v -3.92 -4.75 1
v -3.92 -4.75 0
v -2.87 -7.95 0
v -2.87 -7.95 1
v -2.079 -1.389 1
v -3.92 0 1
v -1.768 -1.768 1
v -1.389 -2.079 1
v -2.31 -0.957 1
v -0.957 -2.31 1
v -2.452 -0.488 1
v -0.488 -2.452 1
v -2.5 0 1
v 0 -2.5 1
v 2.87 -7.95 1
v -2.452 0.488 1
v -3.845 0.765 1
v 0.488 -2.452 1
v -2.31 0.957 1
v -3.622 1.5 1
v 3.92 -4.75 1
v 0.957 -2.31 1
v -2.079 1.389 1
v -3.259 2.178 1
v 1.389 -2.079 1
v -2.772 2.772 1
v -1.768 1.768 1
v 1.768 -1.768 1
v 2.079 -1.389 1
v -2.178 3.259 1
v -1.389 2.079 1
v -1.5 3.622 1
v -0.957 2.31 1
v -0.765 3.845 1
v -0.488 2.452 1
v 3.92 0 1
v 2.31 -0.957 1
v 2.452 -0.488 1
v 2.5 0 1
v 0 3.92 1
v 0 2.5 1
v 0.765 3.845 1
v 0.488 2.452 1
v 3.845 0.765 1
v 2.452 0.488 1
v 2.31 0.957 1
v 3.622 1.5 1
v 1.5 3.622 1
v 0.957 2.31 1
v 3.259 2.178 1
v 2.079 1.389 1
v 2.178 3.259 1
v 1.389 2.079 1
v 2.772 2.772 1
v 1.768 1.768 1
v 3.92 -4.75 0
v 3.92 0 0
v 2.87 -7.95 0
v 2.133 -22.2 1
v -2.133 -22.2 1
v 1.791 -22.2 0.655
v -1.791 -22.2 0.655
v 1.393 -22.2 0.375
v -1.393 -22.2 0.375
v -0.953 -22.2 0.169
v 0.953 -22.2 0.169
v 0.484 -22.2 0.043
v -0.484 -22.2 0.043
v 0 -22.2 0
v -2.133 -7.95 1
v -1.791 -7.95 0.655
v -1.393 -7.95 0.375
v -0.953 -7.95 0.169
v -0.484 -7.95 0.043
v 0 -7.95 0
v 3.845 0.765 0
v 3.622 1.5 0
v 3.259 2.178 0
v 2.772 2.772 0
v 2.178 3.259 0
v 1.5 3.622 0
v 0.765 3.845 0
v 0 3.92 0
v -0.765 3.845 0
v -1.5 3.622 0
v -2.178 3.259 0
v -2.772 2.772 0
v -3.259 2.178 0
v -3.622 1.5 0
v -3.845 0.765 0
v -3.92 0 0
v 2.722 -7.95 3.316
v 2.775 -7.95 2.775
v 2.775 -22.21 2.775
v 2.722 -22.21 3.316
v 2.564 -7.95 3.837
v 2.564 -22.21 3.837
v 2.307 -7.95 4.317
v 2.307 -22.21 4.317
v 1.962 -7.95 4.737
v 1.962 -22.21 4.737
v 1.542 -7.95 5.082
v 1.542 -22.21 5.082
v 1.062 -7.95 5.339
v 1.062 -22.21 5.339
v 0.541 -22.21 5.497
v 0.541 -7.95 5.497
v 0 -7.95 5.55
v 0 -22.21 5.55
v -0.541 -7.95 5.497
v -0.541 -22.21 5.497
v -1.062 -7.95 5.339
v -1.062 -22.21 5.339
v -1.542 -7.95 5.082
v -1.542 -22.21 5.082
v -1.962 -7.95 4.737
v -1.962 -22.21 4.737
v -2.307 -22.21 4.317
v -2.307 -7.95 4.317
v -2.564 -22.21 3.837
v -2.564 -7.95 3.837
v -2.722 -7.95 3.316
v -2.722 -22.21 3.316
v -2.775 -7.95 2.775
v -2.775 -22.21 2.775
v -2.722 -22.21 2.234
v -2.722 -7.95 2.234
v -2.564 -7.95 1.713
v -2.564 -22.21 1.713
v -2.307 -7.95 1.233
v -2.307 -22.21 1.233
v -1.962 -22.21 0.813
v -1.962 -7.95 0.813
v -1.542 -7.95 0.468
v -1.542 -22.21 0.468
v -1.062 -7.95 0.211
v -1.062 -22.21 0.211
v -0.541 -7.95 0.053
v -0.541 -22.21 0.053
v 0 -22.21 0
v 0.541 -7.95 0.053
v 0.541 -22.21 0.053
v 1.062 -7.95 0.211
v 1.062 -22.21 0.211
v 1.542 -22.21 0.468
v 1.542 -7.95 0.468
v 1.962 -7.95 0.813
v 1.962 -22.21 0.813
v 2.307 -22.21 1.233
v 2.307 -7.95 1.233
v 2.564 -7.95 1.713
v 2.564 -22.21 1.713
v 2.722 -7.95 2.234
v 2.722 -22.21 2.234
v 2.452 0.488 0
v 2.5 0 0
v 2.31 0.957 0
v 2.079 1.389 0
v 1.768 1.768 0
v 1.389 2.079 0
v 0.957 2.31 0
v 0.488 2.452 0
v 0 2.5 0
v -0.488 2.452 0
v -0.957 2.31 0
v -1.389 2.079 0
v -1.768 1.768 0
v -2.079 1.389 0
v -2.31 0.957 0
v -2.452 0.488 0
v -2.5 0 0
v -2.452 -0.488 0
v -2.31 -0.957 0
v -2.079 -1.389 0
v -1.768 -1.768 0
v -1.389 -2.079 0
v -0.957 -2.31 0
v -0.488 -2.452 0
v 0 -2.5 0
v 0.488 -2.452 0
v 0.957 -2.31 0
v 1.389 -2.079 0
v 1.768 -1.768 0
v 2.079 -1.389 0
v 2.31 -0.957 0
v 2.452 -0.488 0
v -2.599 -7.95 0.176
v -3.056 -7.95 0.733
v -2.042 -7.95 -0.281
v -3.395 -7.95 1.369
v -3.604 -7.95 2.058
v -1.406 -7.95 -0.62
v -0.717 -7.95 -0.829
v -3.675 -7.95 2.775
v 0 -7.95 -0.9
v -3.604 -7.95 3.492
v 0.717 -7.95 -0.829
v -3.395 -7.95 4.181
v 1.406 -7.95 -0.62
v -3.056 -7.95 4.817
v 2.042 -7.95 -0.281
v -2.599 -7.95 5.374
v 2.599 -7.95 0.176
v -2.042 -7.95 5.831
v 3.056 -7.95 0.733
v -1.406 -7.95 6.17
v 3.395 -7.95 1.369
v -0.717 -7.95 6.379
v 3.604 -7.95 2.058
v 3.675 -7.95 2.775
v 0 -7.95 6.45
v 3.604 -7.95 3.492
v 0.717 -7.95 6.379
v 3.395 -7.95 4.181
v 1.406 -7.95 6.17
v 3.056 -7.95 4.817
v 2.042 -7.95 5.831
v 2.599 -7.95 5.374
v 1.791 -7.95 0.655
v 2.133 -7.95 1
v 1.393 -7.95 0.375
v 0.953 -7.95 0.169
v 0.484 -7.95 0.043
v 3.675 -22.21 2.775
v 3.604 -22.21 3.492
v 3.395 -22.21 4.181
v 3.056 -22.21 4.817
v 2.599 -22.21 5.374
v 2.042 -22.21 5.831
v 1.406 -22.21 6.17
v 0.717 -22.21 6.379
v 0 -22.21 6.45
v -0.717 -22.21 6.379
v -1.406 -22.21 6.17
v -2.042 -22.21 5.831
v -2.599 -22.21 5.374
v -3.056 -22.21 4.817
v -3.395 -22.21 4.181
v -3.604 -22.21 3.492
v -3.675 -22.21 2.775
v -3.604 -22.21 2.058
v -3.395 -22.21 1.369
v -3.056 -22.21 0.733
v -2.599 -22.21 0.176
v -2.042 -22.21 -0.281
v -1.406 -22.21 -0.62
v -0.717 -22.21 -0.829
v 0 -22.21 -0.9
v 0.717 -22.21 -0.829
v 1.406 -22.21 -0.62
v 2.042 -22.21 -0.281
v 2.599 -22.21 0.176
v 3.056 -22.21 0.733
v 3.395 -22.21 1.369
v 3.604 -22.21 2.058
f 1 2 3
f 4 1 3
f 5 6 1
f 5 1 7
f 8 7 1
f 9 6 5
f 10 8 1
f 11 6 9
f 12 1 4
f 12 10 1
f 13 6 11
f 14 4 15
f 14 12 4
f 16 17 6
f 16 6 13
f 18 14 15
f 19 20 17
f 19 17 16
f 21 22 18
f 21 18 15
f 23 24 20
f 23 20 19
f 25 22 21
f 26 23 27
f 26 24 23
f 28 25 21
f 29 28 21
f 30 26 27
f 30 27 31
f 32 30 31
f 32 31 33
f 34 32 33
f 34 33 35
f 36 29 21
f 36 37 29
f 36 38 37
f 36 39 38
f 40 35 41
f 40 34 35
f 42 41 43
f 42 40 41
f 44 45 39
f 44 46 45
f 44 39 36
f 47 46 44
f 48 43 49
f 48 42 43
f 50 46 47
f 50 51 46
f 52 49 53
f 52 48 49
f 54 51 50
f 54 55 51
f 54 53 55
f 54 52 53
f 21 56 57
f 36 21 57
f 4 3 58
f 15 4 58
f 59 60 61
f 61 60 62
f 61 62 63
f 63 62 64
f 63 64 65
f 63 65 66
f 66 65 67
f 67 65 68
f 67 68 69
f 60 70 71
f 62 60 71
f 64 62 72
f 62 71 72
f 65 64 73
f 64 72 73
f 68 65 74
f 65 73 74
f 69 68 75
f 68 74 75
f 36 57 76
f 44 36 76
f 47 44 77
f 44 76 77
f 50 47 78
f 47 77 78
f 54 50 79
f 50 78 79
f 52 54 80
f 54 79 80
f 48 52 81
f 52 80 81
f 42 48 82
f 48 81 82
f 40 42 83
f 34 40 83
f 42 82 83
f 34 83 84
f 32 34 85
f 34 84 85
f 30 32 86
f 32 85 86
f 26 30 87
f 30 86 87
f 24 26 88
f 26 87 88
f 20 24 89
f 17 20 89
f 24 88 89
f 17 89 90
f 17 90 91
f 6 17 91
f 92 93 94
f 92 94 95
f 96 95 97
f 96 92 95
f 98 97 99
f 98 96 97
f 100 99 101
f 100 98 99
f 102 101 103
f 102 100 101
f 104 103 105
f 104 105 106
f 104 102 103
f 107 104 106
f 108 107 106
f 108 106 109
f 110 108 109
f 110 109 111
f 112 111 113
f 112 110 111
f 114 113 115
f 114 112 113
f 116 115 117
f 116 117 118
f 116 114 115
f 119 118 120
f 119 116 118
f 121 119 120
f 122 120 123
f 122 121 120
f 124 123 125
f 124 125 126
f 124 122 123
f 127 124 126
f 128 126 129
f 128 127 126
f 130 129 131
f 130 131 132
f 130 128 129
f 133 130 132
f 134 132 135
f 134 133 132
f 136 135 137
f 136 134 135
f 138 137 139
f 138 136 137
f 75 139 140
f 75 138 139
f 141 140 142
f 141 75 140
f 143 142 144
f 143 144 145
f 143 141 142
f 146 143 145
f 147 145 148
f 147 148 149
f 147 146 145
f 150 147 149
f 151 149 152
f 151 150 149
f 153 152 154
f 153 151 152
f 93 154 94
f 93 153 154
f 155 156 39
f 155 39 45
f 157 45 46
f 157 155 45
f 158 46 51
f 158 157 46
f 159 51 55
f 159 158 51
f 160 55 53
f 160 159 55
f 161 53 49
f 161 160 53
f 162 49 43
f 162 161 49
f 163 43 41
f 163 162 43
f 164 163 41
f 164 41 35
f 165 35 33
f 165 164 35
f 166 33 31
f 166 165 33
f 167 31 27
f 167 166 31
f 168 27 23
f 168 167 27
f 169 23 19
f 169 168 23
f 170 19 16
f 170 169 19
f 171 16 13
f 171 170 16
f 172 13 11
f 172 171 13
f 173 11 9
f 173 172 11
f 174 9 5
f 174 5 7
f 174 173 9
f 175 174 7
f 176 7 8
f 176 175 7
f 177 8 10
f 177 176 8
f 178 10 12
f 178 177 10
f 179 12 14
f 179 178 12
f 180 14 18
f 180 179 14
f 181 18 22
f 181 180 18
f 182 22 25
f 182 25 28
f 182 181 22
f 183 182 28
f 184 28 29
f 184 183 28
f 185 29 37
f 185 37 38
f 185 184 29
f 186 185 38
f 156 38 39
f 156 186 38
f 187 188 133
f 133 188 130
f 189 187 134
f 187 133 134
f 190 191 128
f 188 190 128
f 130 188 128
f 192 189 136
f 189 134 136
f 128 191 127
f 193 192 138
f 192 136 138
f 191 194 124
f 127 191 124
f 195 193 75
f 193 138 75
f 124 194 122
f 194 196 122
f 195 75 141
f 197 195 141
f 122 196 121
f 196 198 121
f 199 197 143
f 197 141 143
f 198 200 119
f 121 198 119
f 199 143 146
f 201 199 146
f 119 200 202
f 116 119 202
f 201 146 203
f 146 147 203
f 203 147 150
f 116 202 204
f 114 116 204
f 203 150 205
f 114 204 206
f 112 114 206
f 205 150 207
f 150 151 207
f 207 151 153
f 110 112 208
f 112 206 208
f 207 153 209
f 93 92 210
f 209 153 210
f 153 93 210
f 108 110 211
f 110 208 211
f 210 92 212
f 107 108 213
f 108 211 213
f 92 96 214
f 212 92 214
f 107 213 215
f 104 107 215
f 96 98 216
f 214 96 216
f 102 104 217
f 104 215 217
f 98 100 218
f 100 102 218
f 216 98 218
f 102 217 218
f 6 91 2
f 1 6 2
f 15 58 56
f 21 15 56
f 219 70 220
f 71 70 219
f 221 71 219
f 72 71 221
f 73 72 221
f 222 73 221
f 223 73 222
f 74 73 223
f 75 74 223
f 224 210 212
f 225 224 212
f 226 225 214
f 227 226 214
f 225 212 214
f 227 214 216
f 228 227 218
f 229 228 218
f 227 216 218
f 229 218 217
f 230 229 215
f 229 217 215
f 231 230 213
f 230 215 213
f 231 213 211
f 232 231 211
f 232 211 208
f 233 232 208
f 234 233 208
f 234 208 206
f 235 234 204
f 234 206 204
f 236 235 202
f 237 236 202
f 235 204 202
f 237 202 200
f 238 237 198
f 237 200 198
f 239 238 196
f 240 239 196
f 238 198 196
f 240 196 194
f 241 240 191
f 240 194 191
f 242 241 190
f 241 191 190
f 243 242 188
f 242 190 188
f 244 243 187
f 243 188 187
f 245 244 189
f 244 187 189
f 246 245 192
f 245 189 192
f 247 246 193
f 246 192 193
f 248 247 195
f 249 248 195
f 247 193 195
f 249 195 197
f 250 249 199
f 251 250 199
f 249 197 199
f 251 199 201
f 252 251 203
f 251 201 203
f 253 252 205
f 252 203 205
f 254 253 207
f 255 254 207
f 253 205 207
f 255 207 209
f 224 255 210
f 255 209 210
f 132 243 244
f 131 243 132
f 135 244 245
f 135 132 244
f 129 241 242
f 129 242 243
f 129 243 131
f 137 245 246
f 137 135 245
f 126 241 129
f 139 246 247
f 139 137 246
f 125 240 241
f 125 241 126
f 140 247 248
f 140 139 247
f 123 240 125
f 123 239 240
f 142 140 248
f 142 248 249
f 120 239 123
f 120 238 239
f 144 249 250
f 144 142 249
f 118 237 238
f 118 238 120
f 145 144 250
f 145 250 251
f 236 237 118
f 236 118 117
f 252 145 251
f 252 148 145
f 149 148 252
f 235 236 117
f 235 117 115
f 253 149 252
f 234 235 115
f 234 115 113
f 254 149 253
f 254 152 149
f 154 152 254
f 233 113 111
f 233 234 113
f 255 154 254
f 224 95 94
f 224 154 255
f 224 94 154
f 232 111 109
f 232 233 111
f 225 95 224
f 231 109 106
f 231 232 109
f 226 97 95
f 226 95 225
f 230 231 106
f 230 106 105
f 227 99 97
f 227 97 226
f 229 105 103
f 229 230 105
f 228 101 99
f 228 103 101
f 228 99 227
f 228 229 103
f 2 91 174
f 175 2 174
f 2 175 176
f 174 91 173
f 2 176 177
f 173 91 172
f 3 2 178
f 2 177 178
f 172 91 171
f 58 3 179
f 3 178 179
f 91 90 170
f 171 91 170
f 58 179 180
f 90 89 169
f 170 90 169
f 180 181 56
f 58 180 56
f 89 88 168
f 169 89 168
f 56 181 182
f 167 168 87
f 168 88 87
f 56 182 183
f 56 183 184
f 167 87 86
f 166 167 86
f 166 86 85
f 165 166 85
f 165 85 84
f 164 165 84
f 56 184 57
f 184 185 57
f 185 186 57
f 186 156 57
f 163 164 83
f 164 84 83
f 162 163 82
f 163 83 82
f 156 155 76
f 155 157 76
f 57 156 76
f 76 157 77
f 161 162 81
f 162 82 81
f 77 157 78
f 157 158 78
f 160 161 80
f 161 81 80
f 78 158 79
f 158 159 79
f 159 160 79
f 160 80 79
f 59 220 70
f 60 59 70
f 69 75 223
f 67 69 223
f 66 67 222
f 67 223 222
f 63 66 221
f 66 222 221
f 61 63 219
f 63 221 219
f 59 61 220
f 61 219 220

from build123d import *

# Parameters (mm, degrees)
F0_R     = 2.5
F1_DEPTH = 1
F2_R     = 3.675
F2_R_2   = 2.775
F3_DEPTH = 14.26
F4_DEPTH = 14.25


with BuildPart() as f1:
    # F0 (on Top) → F1 (new body)
    with BuildSketch(Plane.XY):
        with BuildLine():
            ThreePointArc((-3.92, 0), (0, -3.92), (3.92, 0))
            ThreePointArc((3.92, 0), (0, 3.92), (-3.92, 0))
        make_face()
        Circle(F0_R, mode=Mode.SUBTRACT)
        with BuildLine():
            Line((3.92, -4.75), (3.92, 0))
            ThreePointArc((3.92, 0), (0, -3.92), (-3.92, 0))
            Line((-3.92, 0), (-3.92, -4.75))
            Line((-3.92, -4.75), (-2.87, -7.95))
            Line((-2.87, -7.95), (2.87, -7.95))
            Line((2.87, -7.95), (3.92, -4.75))
        make_face()
    extrude(amount=F1_DEPTH)


with BuildPart() as f3:
    # F2 (on face) → F3 (new body)
    with BuildSketch(Plane.XZ.offset(7.95)):
        with Locations((0, 2.775)):
            Circle(F2_R)
        with Locations((0, 2.775)):
            Circle(F2_R_2, mode=Mode.SUBTRACT)
    extrude(amount=F3_DEPTH)


with BuildPart() as f4:
    # F2 (on face) → F4 (new body)
    with BuildSketch(Plane.XZ.offset(7.95)):
        with BuildLine():
            ThreePointArc((-2.133073, 1), (-1.177922, 0.262407), (0, 0))
            ThreePointArc((0, 0), (1.177922, 0.262407), (2.133073, 1))
            Line((2.133073, 1), (-2.133073, 1))
        make_face()
    extrude(amount=F4_DEPTH)


solid = Compound([f1.part, f3.part, f4.part])
